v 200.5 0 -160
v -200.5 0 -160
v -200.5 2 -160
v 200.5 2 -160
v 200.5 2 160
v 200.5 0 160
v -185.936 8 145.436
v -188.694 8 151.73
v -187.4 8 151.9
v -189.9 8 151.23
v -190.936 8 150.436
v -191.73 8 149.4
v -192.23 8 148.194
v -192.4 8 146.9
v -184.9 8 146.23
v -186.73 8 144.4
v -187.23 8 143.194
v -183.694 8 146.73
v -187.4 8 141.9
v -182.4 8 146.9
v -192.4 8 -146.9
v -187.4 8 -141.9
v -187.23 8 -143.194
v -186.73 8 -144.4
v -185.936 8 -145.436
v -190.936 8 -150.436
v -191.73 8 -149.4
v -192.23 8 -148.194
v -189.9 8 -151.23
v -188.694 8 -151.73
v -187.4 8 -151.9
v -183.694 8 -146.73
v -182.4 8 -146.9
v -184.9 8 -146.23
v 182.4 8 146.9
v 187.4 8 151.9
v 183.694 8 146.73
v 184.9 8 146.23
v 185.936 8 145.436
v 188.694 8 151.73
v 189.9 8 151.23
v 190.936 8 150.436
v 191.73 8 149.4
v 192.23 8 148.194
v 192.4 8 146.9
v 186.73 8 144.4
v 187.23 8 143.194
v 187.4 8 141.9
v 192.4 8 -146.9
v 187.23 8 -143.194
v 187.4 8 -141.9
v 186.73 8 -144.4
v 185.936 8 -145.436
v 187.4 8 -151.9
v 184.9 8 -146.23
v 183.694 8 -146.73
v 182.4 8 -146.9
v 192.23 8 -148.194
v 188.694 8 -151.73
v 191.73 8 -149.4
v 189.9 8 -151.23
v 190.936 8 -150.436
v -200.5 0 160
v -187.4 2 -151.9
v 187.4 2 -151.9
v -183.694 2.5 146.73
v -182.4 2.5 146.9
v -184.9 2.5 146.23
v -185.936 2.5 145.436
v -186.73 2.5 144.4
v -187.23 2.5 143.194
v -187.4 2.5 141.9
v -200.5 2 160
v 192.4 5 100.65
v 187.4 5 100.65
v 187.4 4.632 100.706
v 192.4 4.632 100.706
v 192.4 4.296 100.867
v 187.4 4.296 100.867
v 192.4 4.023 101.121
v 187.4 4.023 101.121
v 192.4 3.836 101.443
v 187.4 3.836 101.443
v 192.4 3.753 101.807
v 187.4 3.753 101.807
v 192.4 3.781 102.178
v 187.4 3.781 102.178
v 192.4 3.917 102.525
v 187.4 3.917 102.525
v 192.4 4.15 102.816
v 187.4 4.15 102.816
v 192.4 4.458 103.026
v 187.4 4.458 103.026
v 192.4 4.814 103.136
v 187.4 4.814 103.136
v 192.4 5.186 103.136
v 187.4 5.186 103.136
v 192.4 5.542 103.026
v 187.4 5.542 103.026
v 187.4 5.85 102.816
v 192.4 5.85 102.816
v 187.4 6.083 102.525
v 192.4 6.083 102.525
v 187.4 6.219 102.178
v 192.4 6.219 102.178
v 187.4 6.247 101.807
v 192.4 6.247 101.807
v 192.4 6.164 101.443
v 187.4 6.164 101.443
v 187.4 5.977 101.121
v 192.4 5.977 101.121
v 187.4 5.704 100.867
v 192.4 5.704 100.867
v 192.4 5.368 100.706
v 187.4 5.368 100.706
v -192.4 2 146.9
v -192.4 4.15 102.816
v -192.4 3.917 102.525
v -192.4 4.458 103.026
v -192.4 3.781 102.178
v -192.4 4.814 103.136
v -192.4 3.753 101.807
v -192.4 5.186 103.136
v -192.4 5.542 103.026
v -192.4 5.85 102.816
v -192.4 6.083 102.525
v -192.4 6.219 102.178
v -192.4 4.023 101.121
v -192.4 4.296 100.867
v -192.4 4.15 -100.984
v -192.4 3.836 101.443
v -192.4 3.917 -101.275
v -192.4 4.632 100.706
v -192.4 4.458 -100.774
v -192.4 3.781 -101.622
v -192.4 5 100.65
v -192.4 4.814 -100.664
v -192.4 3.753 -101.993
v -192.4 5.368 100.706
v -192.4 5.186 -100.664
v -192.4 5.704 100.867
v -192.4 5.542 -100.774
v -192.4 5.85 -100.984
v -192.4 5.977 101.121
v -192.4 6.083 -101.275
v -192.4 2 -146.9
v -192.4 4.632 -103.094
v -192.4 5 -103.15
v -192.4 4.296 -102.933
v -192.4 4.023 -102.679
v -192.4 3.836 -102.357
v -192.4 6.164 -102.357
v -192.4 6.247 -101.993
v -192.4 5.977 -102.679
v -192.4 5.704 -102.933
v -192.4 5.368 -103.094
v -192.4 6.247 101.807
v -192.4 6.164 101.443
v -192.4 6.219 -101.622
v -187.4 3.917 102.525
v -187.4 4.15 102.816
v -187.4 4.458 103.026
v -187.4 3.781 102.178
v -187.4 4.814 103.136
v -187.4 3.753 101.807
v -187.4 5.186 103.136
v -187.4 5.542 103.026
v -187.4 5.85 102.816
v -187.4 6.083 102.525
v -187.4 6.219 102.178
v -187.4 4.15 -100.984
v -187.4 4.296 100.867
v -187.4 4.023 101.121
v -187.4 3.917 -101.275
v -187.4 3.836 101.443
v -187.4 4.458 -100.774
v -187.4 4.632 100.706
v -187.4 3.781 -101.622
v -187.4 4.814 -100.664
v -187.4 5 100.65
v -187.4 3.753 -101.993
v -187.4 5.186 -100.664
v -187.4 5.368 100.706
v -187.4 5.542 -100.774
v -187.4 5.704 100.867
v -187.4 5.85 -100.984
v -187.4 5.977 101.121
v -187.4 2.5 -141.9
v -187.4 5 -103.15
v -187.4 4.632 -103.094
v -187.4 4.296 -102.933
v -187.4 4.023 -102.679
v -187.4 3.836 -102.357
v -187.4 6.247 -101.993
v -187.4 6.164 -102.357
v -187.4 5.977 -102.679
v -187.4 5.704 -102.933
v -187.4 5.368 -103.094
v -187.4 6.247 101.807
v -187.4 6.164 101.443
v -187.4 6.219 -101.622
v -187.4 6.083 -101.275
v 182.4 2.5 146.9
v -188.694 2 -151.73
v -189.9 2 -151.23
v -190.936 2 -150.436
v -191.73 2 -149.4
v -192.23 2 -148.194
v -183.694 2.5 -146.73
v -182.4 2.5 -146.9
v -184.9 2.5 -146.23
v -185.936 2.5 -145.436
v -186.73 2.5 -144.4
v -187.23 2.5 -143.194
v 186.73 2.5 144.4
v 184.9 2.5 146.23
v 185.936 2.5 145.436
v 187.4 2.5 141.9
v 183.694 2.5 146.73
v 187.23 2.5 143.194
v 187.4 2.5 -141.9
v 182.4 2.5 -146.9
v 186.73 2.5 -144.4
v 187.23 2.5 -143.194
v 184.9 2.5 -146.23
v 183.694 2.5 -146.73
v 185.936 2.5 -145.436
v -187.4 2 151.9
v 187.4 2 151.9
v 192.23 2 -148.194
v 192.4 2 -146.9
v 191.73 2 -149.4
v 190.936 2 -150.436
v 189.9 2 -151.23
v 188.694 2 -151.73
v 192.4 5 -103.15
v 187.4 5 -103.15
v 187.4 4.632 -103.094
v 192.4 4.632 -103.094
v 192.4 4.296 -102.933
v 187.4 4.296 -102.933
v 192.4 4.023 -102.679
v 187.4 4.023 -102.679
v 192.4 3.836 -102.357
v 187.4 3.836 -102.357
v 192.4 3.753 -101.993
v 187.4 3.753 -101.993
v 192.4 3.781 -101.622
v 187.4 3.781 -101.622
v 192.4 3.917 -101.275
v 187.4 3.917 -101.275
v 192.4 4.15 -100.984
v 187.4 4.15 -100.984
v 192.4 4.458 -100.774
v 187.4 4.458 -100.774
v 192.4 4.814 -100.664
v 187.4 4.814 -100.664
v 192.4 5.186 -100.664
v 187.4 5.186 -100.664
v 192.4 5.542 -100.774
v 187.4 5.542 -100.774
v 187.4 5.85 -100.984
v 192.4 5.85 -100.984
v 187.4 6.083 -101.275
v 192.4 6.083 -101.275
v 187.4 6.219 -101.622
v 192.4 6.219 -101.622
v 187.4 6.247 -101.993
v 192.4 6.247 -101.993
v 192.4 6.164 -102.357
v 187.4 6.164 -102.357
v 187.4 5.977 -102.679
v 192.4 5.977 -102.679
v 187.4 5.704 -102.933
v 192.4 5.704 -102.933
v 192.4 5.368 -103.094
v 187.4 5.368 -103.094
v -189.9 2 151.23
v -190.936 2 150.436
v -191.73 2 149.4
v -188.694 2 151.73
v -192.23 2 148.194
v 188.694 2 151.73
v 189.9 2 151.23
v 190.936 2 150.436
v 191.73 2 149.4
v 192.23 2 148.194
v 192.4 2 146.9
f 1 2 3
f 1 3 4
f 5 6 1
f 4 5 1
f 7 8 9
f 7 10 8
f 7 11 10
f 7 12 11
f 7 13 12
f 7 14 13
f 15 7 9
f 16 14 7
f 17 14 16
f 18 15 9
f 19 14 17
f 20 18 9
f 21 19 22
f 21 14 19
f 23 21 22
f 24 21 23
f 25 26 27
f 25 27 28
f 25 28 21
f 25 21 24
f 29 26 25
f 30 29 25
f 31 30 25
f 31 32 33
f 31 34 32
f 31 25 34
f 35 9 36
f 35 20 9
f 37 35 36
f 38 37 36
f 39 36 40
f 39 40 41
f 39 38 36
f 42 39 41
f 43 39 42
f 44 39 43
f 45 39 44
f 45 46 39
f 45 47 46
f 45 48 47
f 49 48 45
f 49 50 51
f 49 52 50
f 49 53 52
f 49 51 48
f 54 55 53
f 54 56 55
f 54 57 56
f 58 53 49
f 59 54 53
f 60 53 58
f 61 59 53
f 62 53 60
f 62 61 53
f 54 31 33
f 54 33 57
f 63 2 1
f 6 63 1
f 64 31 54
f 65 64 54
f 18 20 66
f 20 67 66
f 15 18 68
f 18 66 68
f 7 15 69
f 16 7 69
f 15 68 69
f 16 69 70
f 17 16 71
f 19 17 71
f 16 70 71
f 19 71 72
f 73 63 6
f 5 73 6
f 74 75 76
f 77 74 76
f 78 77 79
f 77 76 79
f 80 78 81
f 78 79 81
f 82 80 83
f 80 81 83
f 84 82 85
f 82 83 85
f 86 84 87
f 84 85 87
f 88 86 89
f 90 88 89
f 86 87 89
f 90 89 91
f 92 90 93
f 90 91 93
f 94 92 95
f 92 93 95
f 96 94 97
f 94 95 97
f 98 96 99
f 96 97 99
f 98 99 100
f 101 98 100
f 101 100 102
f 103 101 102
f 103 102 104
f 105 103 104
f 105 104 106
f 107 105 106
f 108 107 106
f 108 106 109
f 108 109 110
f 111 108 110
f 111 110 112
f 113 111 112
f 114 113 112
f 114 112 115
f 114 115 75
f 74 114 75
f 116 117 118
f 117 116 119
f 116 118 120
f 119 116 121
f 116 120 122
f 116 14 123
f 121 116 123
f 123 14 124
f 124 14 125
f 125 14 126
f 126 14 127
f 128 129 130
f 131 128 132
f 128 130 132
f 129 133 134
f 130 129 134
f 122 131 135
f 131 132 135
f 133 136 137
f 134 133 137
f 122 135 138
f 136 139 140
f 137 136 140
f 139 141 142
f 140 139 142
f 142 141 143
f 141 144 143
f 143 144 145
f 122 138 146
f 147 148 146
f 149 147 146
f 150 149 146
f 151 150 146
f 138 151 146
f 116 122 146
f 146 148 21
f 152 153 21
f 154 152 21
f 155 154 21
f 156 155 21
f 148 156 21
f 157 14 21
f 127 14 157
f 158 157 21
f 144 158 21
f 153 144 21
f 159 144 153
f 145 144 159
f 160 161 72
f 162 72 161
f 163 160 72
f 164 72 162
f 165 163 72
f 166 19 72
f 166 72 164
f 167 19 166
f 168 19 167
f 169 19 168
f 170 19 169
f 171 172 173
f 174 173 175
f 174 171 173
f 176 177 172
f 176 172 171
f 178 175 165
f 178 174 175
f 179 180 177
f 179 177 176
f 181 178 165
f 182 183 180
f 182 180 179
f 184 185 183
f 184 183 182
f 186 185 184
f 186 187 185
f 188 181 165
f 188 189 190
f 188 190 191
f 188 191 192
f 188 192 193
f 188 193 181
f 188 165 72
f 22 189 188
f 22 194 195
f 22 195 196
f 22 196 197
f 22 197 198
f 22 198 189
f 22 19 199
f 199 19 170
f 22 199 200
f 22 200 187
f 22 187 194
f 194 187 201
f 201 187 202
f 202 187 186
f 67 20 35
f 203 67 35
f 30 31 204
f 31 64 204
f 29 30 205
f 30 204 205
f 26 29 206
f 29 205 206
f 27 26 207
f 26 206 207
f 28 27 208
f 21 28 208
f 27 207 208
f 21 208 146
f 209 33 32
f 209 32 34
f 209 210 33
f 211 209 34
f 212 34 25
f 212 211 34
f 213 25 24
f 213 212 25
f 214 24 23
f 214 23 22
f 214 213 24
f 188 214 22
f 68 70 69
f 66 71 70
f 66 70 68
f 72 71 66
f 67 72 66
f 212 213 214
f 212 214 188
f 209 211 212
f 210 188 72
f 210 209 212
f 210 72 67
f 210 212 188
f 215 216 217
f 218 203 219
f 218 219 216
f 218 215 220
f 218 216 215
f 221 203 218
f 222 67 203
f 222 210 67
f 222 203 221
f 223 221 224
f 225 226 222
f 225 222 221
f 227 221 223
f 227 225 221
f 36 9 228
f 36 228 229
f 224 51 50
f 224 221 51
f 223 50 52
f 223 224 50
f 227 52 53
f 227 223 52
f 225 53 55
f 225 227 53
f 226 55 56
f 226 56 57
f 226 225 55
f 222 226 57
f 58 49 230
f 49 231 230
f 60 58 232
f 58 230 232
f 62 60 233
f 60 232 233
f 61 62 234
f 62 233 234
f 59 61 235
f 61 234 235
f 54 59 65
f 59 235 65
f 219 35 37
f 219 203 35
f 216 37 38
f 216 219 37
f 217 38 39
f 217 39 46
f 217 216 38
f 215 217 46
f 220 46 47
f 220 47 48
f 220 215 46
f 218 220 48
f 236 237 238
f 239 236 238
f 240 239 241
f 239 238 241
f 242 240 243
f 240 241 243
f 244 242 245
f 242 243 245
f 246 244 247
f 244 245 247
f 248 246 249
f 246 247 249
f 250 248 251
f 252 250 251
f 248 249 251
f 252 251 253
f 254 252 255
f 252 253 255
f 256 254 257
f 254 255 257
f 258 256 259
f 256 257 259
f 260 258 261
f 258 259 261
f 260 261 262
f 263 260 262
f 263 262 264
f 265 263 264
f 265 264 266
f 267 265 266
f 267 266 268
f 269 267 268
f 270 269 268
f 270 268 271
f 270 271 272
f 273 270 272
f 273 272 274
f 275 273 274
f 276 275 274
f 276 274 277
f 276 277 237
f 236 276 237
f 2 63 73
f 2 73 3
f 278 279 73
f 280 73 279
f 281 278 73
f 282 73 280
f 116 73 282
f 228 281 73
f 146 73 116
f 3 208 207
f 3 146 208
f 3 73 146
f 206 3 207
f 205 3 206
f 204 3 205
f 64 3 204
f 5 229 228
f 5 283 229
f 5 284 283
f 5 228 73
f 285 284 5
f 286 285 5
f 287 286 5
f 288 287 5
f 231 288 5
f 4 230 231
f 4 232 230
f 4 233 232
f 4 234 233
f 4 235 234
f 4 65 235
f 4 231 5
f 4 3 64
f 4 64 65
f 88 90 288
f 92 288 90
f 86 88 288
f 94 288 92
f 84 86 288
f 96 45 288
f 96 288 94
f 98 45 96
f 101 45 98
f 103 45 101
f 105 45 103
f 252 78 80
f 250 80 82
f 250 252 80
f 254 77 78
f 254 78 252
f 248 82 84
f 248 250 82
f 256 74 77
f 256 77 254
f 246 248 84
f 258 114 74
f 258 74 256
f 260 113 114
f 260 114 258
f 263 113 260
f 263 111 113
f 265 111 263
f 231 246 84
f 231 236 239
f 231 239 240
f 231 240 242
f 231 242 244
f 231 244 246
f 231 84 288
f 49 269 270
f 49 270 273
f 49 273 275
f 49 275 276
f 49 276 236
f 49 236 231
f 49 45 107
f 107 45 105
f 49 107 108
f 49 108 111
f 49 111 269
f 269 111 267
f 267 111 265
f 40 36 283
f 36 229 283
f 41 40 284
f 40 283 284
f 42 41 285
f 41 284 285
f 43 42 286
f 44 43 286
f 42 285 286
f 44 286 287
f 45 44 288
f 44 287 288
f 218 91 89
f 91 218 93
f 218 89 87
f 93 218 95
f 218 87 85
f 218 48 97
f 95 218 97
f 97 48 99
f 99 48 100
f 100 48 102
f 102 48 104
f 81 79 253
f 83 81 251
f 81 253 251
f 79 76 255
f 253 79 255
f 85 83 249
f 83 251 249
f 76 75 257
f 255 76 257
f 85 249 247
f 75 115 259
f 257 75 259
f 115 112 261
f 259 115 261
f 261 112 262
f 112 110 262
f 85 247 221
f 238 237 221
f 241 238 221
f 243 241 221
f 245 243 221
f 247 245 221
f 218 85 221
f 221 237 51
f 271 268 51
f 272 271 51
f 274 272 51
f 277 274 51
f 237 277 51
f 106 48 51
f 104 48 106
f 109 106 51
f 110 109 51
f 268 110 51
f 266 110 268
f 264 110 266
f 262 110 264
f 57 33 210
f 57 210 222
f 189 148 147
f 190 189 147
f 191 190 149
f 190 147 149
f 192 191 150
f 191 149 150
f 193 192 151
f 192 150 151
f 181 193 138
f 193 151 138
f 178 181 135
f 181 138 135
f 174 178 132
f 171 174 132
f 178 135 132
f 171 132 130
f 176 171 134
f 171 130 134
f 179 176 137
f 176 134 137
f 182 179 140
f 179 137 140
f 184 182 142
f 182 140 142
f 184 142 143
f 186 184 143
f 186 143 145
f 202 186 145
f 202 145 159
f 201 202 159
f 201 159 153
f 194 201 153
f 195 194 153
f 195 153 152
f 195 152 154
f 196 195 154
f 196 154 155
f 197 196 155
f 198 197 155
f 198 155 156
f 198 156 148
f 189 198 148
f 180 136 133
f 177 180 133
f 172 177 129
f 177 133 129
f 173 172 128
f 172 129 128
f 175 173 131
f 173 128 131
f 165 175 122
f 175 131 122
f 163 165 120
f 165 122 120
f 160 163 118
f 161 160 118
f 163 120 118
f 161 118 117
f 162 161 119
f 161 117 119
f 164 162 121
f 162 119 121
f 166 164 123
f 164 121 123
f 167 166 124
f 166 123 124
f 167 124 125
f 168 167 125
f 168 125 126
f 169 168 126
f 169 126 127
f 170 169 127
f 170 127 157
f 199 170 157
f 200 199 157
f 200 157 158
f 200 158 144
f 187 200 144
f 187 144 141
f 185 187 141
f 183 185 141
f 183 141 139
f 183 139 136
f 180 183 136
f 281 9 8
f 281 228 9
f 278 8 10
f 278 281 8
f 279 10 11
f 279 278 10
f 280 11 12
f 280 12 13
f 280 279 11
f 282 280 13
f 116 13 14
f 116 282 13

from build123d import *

# Parameters (mm, degrees)
SKETCH1_W          = 401
SKETCH1_H          = 320
EXTRUDE1_DEPTH     = 8
SKETCH2_W          = 401
SKETCH2_H          = 320
SKETCH2_W_2        = 384.8
SKETCH2_H_2        = 303.8
CUT_EXTRUDE1_DEPTH = 6
SKETCH3_W          = 374.8
SKETCH3_H          = 293.8
CUT_EXTRUDE2_DEPTH = 5.5
FILLET1_R          = 5
SKETCH4_R          = 1.25
CUT_EXTRUDE3_DEPTH = 425.304619348


with BuildPart() as part:
    # Sketch1 → Extrude1 (new body)
    with BuildSketch(Plane(origin=(0, 0, 0), x_dir=(1, 0, 0), z_dir=(0, 1, 0))):
        Rectangle(SKETCH1_W, SKETCH1_H)
    extrude(amount=EXTRUDE1_DEPTH)

    # Sketch2 → Cut-Extrude1 (cut)
    with BuildSketch(Plane(origin=(0, 8, 0), x_dir=(1, 0, 0), z_dir=(0, 1, 0))):
        Rectangle(SKETCH2_W, SKETCH2_H)
        Rectangle(SKETCH2_W_2, SKETCH2_H_2, mode=Mode.SUBTRACT)
    extrude(amount=-CUT_EXTRUDE1_DEPTH, mode=Mode.SUBTRACT)

    # Sketch3 → Cut-Extrude2 (cut)
    with BuildSketch(Plane(origin=(0, 8, 0), x_dir=(1, 0, 0), z_dir=(0, 1, 0))):
        Rectangle(SKETCH3_W, SKETCH3_H)
    extrude(amount=-CUT_EXTRUDE2_DEPTH, mode=Mode.SUBTRACT)

    # Fillet1
    fillet1_edges = [part.edges().sort_by_distance(p)[0] for p in [
        (192.4, 5, 151.9),
        (-192.4, 5, 151.9),
        (-192.4, 5, -151.9),
        (192.4, 5, -151.9),
        (-187.4, 5.25, 146.9),
        (-187.4, 5.25, -146.9),
        (187.4, 5.25, -146.9),
        (187.4, 5.25, 146.9),
    ]]
    fillet(fillet1_edges, radius=FILLET1_R)

    # Sketch4 → Cut-Extrude3 (cut, through all)
    with BuildSketch(Plane.ZY.offset(192.4)):
        with Locations(Location((-101.9, 5, 0), (0, 0, 180))):
            Circle(SKETCH4_R)
        with Locations(Location((101.9, 5, 0), (0, 0, 180))):
            Circle(SKETCH4_R)
    extrude(amount=-CUT_EXTRUDE3_DEPTH, mode=Mode.SUBTRACT)


solid = part.part
